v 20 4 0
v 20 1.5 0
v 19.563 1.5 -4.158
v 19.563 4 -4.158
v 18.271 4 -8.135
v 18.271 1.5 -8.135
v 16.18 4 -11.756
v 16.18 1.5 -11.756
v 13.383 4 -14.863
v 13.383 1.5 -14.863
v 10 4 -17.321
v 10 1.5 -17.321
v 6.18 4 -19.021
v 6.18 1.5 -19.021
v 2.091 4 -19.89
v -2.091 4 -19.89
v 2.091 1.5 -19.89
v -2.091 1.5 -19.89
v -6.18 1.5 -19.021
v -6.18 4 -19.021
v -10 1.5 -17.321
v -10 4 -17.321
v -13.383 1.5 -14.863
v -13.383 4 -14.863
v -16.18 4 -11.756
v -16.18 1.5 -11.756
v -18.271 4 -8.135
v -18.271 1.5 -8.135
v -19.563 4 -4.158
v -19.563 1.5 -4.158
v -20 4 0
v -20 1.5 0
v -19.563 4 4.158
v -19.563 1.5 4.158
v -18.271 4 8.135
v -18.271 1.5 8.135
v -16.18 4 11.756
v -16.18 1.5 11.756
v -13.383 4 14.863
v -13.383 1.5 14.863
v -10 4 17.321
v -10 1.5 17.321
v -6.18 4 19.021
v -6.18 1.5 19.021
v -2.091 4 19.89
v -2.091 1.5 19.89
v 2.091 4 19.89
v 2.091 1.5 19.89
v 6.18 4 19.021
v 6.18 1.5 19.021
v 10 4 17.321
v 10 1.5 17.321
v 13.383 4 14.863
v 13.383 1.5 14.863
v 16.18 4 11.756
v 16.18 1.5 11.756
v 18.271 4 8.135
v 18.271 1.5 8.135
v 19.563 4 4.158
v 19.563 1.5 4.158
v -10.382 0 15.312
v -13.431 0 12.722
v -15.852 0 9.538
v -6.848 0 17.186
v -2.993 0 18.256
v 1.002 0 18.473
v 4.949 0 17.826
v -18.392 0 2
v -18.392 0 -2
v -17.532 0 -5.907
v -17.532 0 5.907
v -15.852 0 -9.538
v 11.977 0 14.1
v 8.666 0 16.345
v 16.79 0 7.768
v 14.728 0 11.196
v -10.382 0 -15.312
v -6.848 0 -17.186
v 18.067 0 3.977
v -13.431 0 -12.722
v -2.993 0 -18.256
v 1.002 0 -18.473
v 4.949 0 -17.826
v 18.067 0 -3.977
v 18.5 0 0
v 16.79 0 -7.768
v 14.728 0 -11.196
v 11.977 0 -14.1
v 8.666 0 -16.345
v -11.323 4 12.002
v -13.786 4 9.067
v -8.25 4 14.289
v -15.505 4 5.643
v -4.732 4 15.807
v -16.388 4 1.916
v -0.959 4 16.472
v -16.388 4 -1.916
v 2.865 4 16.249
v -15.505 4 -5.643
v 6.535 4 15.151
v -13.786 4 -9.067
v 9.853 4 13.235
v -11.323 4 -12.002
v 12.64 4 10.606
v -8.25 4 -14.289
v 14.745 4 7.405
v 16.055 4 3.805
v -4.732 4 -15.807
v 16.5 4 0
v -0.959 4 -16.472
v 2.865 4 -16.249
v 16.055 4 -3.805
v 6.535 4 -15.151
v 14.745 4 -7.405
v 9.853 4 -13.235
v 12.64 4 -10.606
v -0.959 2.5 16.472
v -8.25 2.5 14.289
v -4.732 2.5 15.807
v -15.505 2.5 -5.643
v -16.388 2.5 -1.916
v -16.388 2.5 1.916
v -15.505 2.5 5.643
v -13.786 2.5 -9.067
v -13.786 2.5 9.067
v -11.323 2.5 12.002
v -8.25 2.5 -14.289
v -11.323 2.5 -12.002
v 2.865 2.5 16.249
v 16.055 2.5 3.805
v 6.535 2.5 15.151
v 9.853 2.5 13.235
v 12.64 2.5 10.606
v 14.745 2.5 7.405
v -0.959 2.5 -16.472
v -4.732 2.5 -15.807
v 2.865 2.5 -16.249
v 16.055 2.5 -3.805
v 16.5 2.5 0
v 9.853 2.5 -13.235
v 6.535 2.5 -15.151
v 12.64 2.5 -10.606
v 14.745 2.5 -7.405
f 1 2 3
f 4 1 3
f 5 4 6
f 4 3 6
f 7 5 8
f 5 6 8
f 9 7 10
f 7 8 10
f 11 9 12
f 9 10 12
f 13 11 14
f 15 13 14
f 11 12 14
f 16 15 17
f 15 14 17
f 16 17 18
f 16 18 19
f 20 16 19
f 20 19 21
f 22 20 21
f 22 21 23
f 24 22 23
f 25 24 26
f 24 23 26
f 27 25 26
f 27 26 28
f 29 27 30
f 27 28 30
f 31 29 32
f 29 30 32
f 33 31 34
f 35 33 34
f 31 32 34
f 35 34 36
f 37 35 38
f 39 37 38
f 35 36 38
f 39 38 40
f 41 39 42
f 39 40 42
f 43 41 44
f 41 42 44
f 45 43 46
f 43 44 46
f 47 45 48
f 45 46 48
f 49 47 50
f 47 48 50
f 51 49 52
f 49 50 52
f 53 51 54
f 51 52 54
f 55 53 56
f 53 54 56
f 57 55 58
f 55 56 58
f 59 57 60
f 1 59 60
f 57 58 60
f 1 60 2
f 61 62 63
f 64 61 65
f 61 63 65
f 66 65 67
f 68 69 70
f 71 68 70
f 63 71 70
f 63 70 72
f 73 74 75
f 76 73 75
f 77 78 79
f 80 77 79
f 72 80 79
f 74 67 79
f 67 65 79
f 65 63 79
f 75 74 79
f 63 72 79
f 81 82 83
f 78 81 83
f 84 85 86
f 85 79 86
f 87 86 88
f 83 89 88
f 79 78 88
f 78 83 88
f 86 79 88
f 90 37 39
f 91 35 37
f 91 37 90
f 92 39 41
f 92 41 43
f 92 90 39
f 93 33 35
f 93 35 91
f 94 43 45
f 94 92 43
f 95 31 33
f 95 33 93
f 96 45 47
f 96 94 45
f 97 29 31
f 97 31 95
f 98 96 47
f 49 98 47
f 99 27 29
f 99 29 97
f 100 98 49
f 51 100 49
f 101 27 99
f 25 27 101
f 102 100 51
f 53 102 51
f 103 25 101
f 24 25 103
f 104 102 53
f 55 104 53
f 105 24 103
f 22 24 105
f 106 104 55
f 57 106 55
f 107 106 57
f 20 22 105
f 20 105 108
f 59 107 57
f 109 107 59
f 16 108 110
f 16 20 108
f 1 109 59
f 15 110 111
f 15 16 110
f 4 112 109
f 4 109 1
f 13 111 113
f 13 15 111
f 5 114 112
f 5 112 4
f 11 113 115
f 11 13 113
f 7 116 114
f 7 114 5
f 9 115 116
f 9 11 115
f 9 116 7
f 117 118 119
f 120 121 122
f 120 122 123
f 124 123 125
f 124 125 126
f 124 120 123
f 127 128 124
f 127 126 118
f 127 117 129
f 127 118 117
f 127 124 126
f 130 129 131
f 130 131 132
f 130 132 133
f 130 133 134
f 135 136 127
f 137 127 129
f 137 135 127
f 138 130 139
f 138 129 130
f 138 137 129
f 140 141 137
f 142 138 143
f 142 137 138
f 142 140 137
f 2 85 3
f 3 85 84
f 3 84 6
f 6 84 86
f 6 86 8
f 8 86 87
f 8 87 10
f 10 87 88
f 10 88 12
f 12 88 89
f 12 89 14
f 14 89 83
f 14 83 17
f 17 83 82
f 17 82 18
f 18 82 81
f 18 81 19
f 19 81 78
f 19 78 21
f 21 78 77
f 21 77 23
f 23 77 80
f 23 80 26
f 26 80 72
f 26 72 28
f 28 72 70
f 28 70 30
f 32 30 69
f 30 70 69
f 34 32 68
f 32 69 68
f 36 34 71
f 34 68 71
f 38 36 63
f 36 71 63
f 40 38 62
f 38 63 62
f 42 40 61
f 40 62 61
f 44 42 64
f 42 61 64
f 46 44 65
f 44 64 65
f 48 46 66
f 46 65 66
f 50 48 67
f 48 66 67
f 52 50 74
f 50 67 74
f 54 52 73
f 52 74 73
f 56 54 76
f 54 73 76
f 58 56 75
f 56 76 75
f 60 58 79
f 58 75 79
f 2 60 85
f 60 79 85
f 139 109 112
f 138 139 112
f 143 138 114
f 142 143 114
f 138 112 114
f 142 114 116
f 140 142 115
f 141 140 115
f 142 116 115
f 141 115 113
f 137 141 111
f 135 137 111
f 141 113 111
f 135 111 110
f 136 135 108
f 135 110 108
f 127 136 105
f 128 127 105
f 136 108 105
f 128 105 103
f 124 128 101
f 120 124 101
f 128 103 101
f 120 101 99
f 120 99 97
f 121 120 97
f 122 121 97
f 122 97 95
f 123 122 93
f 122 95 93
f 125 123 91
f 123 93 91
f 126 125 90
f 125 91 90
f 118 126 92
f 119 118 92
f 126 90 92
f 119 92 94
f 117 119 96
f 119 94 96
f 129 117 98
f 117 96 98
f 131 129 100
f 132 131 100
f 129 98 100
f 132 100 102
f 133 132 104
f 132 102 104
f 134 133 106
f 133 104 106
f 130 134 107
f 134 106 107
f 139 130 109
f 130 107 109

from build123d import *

# Parameters (mm, degrees)
SKETCH1_R           = 20
BOSS_EXTRUDE1_DEPTH = 4
SKETCH2_R           = 16.5
CUT_EXTRUDE1_DEPTH  = 1.5
CHAMFER1_SIZE       = 1.5


with BuildPart() as part:
    # Sketch1 → Boss-Extrude1 (new body)
    with BuildSketch(Plane(origin=(0, 0, 0), x_dir=(1, 0, 0), z_dir=(0, 1, 0))):
        Circle(SKETCH1_R)
    extrude(amount=BOSS_EXTRUDE1_DEPTH)

    # Sketch2 → Cut-Extrude1 (cut)
    with BuildSketch(Plane(origin=(0, 4, 0), x_dir=(1, 0, 0), z_dir=(0, 1, 0))):
        Circle(SKETCH2_R)
    extrude(amount=-CUT_EXTRUDE1_DEPTH, mode=Mode.SUBTRACT)

    # Chamfer1
    chamfer1_edges = [part.edges().sort_by_distance(p)[0] for p in [
        (-20, 0, 0),
    ]]
    chamfer(chamfer1_edges, length=CHAMFER1_SIZE)


solid = part.part
